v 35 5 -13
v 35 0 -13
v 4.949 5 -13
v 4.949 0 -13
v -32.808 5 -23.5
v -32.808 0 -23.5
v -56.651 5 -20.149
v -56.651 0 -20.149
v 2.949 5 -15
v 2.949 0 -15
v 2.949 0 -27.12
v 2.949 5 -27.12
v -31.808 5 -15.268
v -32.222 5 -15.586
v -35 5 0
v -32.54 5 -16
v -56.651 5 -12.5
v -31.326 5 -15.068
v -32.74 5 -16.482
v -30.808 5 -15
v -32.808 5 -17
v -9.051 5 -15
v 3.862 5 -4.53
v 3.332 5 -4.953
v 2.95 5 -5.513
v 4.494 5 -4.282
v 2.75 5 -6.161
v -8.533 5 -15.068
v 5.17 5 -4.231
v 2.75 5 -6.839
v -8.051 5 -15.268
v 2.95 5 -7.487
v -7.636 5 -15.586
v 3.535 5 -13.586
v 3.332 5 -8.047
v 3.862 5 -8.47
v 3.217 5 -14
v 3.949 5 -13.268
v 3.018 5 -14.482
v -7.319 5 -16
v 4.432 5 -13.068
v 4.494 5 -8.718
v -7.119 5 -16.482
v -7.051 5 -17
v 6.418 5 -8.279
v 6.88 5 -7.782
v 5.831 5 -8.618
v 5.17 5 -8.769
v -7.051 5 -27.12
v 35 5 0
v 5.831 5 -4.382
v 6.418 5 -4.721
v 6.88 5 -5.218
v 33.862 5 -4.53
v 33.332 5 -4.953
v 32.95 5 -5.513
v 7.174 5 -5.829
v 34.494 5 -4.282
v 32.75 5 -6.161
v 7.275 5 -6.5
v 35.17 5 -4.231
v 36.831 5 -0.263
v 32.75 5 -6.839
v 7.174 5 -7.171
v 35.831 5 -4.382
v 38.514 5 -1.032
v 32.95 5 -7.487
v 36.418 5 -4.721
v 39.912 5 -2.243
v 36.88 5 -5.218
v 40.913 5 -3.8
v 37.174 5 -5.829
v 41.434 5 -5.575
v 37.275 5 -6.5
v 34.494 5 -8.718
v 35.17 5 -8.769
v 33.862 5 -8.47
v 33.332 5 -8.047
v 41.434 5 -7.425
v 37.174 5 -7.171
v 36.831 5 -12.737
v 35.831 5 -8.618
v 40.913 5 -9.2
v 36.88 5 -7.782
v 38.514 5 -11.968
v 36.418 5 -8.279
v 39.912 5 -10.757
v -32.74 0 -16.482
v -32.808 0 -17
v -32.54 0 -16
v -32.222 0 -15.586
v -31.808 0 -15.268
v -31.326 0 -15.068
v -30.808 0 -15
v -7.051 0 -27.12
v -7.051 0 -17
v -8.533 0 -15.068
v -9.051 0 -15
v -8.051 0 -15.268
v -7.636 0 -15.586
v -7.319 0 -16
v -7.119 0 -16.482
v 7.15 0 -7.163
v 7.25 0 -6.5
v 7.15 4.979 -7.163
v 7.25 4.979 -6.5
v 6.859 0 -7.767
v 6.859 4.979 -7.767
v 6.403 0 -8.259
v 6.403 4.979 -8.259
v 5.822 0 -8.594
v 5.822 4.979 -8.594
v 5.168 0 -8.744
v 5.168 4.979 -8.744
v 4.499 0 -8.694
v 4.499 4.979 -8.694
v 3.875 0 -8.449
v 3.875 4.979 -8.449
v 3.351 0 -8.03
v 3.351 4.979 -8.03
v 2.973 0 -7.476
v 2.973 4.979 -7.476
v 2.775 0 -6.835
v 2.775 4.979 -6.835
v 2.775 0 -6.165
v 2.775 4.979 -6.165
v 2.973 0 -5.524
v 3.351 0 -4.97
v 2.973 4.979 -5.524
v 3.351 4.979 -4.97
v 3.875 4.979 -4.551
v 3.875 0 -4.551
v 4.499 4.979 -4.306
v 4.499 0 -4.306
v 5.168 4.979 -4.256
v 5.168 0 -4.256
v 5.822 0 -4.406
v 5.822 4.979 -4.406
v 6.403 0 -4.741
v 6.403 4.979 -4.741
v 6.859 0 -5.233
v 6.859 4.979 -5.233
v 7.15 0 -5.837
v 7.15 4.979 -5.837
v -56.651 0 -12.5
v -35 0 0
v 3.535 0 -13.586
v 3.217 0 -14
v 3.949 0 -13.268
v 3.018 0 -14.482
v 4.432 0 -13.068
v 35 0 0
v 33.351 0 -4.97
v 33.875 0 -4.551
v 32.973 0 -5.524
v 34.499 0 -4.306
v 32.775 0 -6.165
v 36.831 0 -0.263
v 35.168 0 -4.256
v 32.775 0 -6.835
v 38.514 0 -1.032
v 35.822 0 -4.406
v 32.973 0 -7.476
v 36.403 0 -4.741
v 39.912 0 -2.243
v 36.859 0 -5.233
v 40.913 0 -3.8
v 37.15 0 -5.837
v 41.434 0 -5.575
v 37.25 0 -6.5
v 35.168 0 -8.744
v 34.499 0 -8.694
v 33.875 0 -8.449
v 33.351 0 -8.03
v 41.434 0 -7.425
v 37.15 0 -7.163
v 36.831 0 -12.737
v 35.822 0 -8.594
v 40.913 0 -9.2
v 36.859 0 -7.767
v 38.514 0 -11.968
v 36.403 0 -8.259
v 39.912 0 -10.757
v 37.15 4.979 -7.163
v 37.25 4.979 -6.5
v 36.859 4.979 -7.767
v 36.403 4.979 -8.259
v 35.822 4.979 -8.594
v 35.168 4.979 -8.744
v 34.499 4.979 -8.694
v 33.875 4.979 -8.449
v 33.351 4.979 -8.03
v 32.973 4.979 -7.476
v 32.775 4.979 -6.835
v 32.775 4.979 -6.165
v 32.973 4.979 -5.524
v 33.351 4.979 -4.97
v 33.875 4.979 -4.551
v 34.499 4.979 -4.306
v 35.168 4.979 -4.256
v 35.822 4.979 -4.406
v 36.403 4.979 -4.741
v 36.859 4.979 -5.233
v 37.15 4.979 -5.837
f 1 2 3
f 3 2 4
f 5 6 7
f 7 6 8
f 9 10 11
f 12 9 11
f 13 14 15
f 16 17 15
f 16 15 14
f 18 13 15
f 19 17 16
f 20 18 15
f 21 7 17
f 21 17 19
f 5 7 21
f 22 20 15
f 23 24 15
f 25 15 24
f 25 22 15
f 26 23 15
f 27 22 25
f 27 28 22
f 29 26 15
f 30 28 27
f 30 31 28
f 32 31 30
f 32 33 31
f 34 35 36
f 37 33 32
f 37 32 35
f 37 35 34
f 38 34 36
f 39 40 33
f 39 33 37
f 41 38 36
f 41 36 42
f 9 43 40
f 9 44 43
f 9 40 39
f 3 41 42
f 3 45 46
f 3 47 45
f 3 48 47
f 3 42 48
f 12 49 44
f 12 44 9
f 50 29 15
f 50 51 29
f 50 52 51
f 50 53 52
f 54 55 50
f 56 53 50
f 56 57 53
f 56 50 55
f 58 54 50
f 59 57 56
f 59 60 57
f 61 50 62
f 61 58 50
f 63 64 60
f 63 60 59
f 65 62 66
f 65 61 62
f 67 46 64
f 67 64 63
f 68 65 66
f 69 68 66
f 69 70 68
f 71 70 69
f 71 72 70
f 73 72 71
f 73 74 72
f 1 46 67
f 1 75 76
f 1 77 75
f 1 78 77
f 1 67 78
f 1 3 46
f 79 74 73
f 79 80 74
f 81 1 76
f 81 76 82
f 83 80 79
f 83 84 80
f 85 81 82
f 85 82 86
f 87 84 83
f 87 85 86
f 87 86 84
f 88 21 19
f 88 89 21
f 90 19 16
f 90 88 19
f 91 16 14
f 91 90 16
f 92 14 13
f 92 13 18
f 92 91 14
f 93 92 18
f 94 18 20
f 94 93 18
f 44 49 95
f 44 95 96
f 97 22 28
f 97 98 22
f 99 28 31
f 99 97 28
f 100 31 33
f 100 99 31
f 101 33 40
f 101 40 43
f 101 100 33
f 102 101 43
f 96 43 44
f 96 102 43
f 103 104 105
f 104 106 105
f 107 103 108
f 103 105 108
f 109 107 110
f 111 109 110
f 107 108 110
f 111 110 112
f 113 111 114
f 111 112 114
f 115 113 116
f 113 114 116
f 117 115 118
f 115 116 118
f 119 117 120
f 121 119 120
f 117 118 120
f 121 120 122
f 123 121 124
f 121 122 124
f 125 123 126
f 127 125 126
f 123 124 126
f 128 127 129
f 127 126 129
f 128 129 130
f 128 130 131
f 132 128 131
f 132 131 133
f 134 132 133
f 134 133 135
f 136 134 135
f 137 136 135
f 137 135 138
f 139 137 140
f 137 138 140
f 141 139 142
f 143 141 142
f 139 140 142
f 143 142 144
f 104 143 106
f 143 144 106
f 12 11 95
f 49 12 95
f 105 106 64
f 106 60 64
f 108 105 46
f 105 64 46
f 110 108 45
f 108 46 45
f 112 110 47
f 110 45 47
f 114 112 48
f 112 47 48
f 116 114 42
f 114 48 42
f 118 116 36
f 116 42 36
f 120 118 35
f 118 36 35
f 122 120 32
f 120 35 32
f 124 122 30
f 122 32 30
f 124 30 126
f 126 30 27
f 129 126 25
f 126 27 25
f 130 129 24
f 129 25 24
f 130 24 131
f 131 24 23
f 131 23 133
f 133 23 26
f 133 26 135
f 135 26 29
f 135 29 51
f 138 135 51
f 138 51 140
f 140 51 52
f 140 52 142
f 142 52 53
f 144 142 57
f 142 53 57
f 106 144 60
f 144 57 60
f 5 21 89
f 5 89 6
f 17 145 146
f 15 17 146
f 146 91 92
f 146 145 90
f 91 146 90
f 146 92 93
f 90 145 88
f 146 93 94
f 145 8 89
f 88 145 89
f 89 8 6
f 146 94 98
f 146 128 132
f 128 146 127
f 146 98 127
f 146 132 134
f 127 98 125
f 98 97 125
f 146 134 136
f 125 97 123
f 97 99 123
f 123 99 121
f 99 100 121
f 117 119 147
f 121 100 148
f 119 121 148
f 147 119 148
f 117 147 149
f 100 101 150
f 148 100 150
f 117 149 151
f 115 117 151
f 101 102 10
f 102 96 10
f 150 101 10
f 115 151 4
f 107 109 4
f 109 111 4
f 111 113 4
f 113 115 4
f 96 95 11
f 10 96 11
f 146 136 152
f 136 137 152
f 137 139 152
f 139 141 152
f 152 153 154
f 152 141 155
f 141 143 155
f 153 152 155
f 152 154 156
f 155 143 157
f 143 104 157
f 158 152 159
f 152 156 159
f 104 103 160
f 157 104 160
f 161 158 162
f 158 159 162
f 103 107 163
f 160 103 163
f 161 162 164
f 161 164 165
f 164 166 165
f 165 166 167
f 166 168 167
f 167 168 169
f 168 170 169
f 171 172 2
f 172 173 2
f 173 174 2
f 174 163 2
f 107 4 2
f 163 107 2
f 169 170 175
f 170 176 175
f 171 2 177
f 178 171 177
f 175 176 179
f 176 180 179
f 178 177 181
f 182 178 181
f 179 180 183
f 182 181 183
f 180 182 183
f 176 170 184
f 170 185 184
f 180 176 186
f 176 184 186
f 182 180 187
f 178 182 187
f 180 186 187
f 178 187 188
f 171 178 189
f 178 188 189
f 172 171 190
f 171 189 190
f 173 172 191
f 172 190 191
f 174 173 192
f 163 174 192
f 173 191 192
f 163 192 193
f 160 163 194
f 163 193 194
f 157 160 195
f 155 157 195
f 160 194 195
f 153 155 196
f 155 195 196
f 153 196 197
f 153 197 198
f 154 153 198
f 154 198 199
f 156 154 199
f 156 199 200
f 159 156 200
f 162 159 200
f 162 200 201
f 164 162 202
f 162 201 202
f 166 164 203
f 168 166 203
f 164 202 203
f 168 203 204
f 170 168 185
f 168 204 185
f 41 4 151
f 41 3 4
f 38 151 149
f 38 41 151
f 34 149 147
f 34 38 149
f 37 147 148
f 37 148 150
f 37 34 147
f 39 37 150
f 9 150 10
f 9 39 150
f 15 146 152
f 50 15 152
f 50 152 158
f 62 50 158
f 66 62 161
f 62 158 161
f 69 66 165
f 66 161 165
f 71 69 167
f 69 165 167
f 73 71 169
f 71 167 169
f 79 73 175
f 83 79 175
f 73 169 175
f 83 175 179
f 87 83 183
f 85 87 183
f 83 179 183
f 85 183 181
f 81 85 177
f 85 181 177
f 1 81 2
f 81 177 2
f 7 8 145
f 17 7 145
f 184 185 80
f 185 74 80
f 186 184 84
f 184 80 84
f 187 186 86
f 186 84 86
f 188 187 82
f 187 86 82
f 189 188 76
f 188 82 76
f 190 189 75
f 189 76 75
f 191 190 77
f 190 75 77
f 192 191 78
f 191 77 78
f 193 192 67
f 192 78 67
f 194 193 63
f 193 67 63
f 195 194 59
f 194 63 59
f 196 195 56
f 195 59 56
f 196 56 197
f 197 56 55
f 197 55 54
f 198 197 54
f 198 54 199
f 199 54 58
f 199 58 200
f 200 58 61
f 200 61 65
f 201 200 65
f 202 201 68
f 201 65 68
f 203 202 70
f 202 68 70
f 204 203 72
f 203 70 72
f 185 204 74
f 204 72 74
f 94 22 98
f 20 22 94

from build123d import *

# Parameters (mm, degrees)
BOSS_EXTRUDE1_DEPTH = 5
CUT_EXTRUDE1_DEPTH  = 64.006260456
FILLET2_R           = 2


# Read off the part's stored shape, not the designer's step: M4 Clearance Hole1
with BuildPart() as part:
    # Sketch1 → Boss-Extrude1 (new body)
    with BuildSketch(Plane(origin=(0, 0, 0), x_dir=(1, 0, 0), z_dir=(0, 1, 0))):
        with BuildLine():
            Line((-35, 0), (35, 0))
            ThreePointArc((35, 0), (41.5, 6.5), (35, 13))
            Line((35, 13), (2.949364905, 13))
            Line((2.949364905, 13), (2.949364905, 27.12))
            Line((2.949364905, 27.12), (-7.050635095, 27.12))
            Line((-7.050635095, 27.12), (-56.650635095, 20.149174599))
            Line((-56.650635095, 20.149174599), (-56.650635095, 12.5))
            Line((-56.650635095, 12.5), (-35, 0))
        make_face()
    extrude(amount=BOSS_EXTRUDE1_DEPTH)

    # M4 Clearance Hole1 outline → M4 Clearance Hole1 (revolve, cut)
    with BuildSketch(Plane(origin=(5, 0, -6.5), x_dir=(1, 0, 0), z_dir=(0, 0, 1))):
        Polygon((0, 0), (2.25, 0), (2.25, 4.979022509), (2.275, 5), (0, 5), align=None)
    revolve(axis=Axis((5, 0, -6.5), (0, 1, 0)), mode=Mode.SUBTRACT)

    # M4 Clearance Hole1 2 outline → M4 Clearance Hole1 2 (revolve, cut)
    with BuildSketch(Plane(origin=(35, 0, -6.5), x_dir=(1, 0, 0), z_dir=(0, 0, 1))):
        Polygon((0, 0), (2.25, 0), (2.25, 4.979022509), (2.275, 5), (0, 5), align=None)
    revolve(axis=Axis((35, 0, -6.5), (0, 1, 0)), mode=Mode.SUBTRACT)

    # Sketch4 → Cut-Extrude1 (cut, through all)
    with BuildSketch(Plane(origin=(0, 5, 0), x_dir=(1, 0, 0), z_dir=(0, 1, 0))):
        Polygon((-32.80827349, 23.5), (-7.050635095, 27.12), (-7.050635095, 15), (-32.80827349, 15), align=None)
    extrude(amount=-CUT_EXTRUDE1_DEPTH, mode=Mode.SUBTRACT)

    # Fillet2
    fillet2_edges = [part.edges().sort_by_distance(p)[0] for p in [
        (2.949364905, 2.5, -13),
        (-7.050635095, 2.5, -15),
        (-32.80827349, 2.5, -15),
    ]]
    fillet(fillet2_edges, radius=FILLET2_R)


solid = part.part
